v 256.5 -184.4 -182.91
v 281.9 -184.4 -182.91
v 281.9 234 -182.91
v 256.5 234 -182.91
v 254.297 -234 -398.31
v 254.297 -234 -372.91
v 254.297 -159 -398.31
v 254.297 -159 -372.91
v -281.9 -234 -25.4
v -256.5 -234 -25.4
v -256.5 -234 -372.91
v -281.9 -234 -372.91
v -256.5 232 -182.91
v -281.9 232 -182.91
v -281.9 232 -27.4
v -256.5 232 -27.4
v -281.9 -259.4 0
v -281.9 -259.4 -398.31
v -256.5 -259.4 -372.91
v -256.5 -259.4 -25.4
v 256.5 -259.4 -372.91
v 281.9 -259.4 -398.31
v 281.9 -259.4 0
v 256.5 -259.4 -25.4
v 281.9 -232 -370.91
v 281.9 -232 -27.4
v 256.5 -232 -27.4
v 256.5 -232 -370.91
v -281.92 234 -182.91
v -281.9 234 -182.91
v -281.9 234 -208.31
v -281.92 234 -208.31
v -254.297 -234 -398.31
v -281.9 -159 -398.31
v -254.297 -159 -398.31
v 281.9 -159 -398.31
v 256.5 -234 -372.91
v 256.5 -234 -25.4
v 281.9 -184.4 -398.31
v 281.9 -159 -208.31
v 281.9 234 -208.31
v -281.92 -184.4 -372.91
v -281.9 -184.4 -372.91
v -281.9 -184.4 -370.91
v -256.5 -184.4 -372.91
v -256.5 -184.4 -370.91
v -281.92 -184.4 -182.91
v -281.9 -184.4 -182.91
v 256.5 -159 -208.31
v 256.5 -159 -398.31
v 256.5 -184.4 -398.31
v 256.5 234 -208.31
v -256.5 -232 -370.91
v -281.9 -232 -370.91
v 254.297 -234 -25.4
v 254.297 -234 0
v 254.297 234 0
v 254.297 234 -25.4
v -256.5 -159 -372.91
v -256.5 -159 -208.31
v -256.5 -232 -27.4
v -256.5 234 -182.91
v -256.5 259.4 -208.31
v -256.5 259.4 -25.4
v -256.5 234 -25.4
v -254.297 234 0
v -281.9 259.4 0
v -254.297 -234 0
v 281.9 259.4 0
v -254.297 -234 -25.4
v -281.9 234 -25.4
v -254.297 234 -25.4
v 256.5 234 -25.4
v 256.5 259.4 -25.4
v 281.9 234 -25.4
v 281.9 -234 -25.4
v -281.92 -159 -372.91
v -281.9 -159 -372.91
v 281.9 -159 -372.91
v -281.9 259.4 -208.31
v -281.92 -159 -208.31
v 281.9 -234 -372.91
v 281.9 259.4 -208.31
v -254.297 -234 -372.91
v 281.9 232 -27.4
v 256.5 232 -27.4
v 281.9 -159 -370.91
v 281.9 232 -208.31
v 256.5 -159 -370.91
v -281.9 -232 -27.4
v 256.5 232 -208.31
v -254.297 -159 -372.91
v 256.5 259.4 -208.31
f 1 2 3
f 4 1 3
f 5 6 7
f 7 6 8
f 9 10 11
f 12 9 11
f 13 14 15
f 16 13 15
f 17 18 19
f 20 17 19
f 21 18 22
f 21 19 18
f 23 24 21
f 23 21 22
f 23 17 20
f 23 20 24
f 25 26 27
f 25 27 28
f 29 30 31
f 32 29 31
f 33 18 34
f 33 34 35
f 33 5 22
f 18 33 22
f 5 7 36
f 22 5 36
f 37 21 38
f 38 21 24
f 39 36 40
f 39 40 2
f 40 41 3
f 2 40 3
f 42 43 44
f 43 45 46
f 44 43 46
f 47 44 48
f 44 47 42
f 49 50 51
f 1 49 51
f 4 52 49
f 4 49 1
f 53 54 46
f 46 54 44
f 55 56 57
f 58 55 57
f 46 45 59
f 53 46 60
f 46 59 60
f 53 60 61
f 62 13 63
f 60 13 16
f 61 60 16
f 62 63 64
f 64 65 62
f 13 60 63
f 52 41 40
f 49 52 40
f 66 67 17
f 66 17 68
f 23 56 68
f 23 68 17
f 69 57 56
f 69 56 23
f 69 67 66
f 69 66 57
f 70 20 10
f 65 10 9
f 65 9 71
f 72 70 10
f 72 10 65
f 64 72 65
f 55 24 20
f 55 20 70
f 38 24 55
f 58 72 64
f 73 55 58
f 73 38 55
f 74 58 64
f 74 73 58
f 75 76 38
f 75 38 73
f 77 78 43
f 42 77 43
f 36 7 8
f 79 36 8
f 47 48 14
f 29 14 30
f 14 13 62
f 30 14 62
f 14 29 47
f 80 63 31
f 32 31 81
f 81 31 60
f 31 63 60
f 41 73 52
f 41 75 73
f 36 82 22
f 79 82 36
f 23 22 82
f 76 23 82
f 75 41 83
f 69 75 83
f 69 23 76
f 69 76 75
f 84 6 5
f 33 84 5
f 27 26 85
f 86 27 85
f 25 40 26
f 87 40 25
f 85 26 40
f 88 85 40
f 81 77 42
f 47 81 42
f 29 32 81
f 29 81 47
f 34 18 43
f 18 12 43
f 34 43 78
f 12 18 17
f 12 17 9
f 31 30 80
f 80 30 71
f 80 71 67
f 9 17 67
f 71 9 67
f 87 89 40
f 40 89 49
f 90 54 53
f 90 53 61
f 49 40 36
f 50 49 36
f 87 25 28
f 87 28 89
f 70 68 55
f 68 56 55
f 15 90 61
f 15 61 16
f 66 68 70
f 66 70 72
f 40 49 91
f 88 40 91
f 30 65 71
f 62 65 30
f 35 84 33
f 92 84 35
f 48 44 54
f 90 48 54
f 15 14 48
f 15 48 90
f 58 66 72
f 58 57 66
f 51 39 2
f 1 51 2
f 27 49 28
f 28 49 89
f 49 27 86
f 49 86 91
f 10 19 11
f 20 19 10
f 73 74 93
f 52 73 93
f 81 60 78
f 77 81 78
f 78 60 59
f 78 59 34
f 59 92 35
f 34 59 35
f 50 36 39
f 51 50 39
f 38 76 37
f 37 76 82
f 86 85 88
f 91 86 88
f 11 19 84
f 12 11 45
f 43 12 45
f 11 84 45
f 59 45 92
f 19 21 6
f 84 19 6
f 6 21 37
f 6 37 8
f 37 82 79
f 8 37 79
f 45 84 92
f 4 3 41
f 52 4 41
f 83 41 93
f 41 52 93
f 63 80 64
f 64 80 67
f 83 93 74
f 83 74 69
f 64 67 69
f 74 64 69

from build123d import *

# Parameters (mm, degrees)
CROQUIS1_W                   = 563.8
CROQUIS1_H                   = 518.8
CROQUIS1_W_2                 = 508.593677718
CROQUIS1_H_2                 = 468
SALIENTE_EXTRUIR1_DEPTH      = 398.31
CORTAR_EXTRUIR1_REACH        = 739.435
CROQUIS2_W                   = 347.51
CROQUIS2_H                   = 468
CROQUIS3_W                   = 513
CROQUIS3_H                   = 347.51
CORTAR_EXTRUIR2_DEPTH        = 410
CROQUIS4_W                   = 513
CROQUIS4_H                   = 347.51
CORTAR_EXTRUIR3_DEPTH        = 40
CROQUIS5_W                   = 343.51
CROQUIS5_H                   = 464
SALIENTE_EXTRUIR2_DEPTH      = 25.4
CROQUIS6_W                   = 343.51
CROQUIS6_H                   = 464
SALIENTE_EXTRUIR3_DEPTH      = 25.4
CROQUIS7_W                   = 190
CROQUIS7_H                   = 418.4
CORTAR_EXTRUIR6_DEPTH        = 584
SALIENTE_EXTRUIR4_DEPTH      = 25.4
SALIENTE_EXTRUIR5_DEPTH      = 0.02
SALIENTE_EXTRUIR5_DEPTH_BACK = 25.4


with BuildPart() as part:
    # Croquis1 → Saliente-Extruir1 (new body)
    with BuildSketch(Plane.XY):
        Rectangle(CROQUIS1_W, CROQUIS1_H)
        Rectangle(CROQUIS1_W_2, CROQUIS1_H_2, mode=Mode.SUBTRACT)
    extrude(amount=-SALIENTE_EXTRUIR1_DEPTH)

    # Cortar-Extruir1: up to this face of the body (flat: up to its plane)
    cortar_extruir1_end = Plane(part.part.faces().sort_by_distance((-281.9, 0, -199.155))[0])
    # Croquis2 → Cortar-Extruir1 (cut, up to the picked face)
    with BuildSketch(Plane(origin=(281.9, 0, 0), x_dir=(0, 0, -1), z_dir=(1, 0, 0)), mode=Mode.PRIVATE) as cortar_extruir1_sk1:
        with Locations((199.155, 0)):
            Rectangle(CROQUIS2_W, CROQUIS2_H)
    cortar_extruir1_tool1 = split(extrude(cortar_extruir1_sk1.sketch, amount=-CORTAR_EXTRUIR1_REACH, mode=Mode.PRIVATE), bisect_by=cortar_extruir1_end, keep=Keep.BOTH, mode=Mode.PRIVATE)
    add(cortar_extruir1_tool1.solids().sort_by(Axis((281.9, 0, -199.155), (-1, 0, 0)))[0], mode=Mode.SUBTRACT)

    # Croquis3 → Cortar-Extruir2 (cut)
    with BuildSketch(Plane(origin=(0, 259.4, 0), x_dir=(1, 0, 0), z_dir=(0, 1, 0))):
        with Locations((0, 199.155)):
            Rectangle(CROQUIS3_W, CROQUIS3_H)
    extrude(amount=-CORTAR_EXTRUIR2_DEPTH, mode=Mode.SUBTRACT)

    # Croquis4 → Cortar-Extruir3 (cut)
    with BuildSketch(Plane.XZ.offset(259.4)):
        with Locations((0, -199.155)):
            Rectangle(CROQUIS4_W, CROQUIS4_H)
    extrude(amount=-CORTAR_EXTRUIR3_DEPTH, mode=Mode.SUBTRACT)


with BuildPart() as body_2:
    # Croquis5 → Saliente-Extruir2 (new body)
    with BuildSketch(Plane(origin=(281.9, 0, 0), x_dir=(0, 0, -1), z_dir=(1, 0, 0))):
        with Locations((199.155, 0)):
            Rectangle(CROQUIS5_W, CROQUIS5_H)
    extrude(amount=-SALIENTE_EXTRUIR2_DEPTH)


with BuildPart() as body_3:
    # Croquis6 → Saliente-Extruir3 (new body)
    with BuildSketch(Plane.ZY.offset(281.9)):
        with Locations((-199.155, 0)):
            Rectangle(CROQUIS6_W, CROQUIS6_H)
    extrude(amount=-SALIENTE_EXTRUIR3_DEPTH)


with BuildPart() as cortar_extruir6_tool:
    # Croquis7 → Cortar-Extruir6 (new body)
    with BuildSketch(Plane.ZY.offset(281.9)):
        with Locations((-303.31, 50.2)):
            Rectangle(CROQUIS7_W, CROQUIS7_H)
    extrude(amount=-CORTAR_EXTRUIR6_DEPTH)


with BuildPart() as part_1:
    add(part.part)

    # Cortar-Extruir6: cut by cortar_extruir6_tool
    add(cortar_extruir6_tool.part, mode=Mode.SUBTRACT)



with BuildPart() as body_2_1:
    add(body_2.part)

    # Cortar-Extruir6: cut by cortar_extruir6_tool
    add(cortar_extruir6_tool.part, mode=Mode.SUBTRACT)


with BuildPart() as body_3_1:
    add(body_3.part)

    # Cortar-Extruir6: cut by cortar_extruir6_tool
    add(cortar_extruir6_tool.part, mode=Mode.SUBTRACT)


with BuildPart() as body_4:
    # Croquis9 → Saliente-Extruir4 (new body)
    with BuildSketch(Plane(origin=(281.9, 0, 0), x_dir=(0, 0, -1), z_dir=(1, 0, 0))):
        Polygon((208.31, 234), (208.31, -159), (398.31, -159), (398.31, -184.4), (182.91, -184.4), (182.91, 234), align=None)
    extrude(amount=-SALIENTE_EXTRUIR4_DEPTH)


with BuildPart() as part_2:
    add(part_1.part)

    add(body_3_1.part)  # Saliente-Extruir5 merges body 3
    # Croquis10 → Saliente-Extruir5 (add, two sides: drawn at the far end of the back side and taken through both)
    with BuildSketch(Plane.ZY.offset(281.9).offset(-SALIENTE_EXTRUIR5_DEPTH_BACK)):
        Polygon((-182.91, 234), (-208.31, 234), (-208.31, -159), (-372.91, -159), (-372.91, -184.4), (-182.91, -184.4), align=None)
    extrude(amount=SALIENTE_EXTRUIR5_DEPTH + SALIENTE_EXTRUIR5_DEPTH_BACK)


solid = Compound([body_2_1.part, body_4.part, part_2.part])
